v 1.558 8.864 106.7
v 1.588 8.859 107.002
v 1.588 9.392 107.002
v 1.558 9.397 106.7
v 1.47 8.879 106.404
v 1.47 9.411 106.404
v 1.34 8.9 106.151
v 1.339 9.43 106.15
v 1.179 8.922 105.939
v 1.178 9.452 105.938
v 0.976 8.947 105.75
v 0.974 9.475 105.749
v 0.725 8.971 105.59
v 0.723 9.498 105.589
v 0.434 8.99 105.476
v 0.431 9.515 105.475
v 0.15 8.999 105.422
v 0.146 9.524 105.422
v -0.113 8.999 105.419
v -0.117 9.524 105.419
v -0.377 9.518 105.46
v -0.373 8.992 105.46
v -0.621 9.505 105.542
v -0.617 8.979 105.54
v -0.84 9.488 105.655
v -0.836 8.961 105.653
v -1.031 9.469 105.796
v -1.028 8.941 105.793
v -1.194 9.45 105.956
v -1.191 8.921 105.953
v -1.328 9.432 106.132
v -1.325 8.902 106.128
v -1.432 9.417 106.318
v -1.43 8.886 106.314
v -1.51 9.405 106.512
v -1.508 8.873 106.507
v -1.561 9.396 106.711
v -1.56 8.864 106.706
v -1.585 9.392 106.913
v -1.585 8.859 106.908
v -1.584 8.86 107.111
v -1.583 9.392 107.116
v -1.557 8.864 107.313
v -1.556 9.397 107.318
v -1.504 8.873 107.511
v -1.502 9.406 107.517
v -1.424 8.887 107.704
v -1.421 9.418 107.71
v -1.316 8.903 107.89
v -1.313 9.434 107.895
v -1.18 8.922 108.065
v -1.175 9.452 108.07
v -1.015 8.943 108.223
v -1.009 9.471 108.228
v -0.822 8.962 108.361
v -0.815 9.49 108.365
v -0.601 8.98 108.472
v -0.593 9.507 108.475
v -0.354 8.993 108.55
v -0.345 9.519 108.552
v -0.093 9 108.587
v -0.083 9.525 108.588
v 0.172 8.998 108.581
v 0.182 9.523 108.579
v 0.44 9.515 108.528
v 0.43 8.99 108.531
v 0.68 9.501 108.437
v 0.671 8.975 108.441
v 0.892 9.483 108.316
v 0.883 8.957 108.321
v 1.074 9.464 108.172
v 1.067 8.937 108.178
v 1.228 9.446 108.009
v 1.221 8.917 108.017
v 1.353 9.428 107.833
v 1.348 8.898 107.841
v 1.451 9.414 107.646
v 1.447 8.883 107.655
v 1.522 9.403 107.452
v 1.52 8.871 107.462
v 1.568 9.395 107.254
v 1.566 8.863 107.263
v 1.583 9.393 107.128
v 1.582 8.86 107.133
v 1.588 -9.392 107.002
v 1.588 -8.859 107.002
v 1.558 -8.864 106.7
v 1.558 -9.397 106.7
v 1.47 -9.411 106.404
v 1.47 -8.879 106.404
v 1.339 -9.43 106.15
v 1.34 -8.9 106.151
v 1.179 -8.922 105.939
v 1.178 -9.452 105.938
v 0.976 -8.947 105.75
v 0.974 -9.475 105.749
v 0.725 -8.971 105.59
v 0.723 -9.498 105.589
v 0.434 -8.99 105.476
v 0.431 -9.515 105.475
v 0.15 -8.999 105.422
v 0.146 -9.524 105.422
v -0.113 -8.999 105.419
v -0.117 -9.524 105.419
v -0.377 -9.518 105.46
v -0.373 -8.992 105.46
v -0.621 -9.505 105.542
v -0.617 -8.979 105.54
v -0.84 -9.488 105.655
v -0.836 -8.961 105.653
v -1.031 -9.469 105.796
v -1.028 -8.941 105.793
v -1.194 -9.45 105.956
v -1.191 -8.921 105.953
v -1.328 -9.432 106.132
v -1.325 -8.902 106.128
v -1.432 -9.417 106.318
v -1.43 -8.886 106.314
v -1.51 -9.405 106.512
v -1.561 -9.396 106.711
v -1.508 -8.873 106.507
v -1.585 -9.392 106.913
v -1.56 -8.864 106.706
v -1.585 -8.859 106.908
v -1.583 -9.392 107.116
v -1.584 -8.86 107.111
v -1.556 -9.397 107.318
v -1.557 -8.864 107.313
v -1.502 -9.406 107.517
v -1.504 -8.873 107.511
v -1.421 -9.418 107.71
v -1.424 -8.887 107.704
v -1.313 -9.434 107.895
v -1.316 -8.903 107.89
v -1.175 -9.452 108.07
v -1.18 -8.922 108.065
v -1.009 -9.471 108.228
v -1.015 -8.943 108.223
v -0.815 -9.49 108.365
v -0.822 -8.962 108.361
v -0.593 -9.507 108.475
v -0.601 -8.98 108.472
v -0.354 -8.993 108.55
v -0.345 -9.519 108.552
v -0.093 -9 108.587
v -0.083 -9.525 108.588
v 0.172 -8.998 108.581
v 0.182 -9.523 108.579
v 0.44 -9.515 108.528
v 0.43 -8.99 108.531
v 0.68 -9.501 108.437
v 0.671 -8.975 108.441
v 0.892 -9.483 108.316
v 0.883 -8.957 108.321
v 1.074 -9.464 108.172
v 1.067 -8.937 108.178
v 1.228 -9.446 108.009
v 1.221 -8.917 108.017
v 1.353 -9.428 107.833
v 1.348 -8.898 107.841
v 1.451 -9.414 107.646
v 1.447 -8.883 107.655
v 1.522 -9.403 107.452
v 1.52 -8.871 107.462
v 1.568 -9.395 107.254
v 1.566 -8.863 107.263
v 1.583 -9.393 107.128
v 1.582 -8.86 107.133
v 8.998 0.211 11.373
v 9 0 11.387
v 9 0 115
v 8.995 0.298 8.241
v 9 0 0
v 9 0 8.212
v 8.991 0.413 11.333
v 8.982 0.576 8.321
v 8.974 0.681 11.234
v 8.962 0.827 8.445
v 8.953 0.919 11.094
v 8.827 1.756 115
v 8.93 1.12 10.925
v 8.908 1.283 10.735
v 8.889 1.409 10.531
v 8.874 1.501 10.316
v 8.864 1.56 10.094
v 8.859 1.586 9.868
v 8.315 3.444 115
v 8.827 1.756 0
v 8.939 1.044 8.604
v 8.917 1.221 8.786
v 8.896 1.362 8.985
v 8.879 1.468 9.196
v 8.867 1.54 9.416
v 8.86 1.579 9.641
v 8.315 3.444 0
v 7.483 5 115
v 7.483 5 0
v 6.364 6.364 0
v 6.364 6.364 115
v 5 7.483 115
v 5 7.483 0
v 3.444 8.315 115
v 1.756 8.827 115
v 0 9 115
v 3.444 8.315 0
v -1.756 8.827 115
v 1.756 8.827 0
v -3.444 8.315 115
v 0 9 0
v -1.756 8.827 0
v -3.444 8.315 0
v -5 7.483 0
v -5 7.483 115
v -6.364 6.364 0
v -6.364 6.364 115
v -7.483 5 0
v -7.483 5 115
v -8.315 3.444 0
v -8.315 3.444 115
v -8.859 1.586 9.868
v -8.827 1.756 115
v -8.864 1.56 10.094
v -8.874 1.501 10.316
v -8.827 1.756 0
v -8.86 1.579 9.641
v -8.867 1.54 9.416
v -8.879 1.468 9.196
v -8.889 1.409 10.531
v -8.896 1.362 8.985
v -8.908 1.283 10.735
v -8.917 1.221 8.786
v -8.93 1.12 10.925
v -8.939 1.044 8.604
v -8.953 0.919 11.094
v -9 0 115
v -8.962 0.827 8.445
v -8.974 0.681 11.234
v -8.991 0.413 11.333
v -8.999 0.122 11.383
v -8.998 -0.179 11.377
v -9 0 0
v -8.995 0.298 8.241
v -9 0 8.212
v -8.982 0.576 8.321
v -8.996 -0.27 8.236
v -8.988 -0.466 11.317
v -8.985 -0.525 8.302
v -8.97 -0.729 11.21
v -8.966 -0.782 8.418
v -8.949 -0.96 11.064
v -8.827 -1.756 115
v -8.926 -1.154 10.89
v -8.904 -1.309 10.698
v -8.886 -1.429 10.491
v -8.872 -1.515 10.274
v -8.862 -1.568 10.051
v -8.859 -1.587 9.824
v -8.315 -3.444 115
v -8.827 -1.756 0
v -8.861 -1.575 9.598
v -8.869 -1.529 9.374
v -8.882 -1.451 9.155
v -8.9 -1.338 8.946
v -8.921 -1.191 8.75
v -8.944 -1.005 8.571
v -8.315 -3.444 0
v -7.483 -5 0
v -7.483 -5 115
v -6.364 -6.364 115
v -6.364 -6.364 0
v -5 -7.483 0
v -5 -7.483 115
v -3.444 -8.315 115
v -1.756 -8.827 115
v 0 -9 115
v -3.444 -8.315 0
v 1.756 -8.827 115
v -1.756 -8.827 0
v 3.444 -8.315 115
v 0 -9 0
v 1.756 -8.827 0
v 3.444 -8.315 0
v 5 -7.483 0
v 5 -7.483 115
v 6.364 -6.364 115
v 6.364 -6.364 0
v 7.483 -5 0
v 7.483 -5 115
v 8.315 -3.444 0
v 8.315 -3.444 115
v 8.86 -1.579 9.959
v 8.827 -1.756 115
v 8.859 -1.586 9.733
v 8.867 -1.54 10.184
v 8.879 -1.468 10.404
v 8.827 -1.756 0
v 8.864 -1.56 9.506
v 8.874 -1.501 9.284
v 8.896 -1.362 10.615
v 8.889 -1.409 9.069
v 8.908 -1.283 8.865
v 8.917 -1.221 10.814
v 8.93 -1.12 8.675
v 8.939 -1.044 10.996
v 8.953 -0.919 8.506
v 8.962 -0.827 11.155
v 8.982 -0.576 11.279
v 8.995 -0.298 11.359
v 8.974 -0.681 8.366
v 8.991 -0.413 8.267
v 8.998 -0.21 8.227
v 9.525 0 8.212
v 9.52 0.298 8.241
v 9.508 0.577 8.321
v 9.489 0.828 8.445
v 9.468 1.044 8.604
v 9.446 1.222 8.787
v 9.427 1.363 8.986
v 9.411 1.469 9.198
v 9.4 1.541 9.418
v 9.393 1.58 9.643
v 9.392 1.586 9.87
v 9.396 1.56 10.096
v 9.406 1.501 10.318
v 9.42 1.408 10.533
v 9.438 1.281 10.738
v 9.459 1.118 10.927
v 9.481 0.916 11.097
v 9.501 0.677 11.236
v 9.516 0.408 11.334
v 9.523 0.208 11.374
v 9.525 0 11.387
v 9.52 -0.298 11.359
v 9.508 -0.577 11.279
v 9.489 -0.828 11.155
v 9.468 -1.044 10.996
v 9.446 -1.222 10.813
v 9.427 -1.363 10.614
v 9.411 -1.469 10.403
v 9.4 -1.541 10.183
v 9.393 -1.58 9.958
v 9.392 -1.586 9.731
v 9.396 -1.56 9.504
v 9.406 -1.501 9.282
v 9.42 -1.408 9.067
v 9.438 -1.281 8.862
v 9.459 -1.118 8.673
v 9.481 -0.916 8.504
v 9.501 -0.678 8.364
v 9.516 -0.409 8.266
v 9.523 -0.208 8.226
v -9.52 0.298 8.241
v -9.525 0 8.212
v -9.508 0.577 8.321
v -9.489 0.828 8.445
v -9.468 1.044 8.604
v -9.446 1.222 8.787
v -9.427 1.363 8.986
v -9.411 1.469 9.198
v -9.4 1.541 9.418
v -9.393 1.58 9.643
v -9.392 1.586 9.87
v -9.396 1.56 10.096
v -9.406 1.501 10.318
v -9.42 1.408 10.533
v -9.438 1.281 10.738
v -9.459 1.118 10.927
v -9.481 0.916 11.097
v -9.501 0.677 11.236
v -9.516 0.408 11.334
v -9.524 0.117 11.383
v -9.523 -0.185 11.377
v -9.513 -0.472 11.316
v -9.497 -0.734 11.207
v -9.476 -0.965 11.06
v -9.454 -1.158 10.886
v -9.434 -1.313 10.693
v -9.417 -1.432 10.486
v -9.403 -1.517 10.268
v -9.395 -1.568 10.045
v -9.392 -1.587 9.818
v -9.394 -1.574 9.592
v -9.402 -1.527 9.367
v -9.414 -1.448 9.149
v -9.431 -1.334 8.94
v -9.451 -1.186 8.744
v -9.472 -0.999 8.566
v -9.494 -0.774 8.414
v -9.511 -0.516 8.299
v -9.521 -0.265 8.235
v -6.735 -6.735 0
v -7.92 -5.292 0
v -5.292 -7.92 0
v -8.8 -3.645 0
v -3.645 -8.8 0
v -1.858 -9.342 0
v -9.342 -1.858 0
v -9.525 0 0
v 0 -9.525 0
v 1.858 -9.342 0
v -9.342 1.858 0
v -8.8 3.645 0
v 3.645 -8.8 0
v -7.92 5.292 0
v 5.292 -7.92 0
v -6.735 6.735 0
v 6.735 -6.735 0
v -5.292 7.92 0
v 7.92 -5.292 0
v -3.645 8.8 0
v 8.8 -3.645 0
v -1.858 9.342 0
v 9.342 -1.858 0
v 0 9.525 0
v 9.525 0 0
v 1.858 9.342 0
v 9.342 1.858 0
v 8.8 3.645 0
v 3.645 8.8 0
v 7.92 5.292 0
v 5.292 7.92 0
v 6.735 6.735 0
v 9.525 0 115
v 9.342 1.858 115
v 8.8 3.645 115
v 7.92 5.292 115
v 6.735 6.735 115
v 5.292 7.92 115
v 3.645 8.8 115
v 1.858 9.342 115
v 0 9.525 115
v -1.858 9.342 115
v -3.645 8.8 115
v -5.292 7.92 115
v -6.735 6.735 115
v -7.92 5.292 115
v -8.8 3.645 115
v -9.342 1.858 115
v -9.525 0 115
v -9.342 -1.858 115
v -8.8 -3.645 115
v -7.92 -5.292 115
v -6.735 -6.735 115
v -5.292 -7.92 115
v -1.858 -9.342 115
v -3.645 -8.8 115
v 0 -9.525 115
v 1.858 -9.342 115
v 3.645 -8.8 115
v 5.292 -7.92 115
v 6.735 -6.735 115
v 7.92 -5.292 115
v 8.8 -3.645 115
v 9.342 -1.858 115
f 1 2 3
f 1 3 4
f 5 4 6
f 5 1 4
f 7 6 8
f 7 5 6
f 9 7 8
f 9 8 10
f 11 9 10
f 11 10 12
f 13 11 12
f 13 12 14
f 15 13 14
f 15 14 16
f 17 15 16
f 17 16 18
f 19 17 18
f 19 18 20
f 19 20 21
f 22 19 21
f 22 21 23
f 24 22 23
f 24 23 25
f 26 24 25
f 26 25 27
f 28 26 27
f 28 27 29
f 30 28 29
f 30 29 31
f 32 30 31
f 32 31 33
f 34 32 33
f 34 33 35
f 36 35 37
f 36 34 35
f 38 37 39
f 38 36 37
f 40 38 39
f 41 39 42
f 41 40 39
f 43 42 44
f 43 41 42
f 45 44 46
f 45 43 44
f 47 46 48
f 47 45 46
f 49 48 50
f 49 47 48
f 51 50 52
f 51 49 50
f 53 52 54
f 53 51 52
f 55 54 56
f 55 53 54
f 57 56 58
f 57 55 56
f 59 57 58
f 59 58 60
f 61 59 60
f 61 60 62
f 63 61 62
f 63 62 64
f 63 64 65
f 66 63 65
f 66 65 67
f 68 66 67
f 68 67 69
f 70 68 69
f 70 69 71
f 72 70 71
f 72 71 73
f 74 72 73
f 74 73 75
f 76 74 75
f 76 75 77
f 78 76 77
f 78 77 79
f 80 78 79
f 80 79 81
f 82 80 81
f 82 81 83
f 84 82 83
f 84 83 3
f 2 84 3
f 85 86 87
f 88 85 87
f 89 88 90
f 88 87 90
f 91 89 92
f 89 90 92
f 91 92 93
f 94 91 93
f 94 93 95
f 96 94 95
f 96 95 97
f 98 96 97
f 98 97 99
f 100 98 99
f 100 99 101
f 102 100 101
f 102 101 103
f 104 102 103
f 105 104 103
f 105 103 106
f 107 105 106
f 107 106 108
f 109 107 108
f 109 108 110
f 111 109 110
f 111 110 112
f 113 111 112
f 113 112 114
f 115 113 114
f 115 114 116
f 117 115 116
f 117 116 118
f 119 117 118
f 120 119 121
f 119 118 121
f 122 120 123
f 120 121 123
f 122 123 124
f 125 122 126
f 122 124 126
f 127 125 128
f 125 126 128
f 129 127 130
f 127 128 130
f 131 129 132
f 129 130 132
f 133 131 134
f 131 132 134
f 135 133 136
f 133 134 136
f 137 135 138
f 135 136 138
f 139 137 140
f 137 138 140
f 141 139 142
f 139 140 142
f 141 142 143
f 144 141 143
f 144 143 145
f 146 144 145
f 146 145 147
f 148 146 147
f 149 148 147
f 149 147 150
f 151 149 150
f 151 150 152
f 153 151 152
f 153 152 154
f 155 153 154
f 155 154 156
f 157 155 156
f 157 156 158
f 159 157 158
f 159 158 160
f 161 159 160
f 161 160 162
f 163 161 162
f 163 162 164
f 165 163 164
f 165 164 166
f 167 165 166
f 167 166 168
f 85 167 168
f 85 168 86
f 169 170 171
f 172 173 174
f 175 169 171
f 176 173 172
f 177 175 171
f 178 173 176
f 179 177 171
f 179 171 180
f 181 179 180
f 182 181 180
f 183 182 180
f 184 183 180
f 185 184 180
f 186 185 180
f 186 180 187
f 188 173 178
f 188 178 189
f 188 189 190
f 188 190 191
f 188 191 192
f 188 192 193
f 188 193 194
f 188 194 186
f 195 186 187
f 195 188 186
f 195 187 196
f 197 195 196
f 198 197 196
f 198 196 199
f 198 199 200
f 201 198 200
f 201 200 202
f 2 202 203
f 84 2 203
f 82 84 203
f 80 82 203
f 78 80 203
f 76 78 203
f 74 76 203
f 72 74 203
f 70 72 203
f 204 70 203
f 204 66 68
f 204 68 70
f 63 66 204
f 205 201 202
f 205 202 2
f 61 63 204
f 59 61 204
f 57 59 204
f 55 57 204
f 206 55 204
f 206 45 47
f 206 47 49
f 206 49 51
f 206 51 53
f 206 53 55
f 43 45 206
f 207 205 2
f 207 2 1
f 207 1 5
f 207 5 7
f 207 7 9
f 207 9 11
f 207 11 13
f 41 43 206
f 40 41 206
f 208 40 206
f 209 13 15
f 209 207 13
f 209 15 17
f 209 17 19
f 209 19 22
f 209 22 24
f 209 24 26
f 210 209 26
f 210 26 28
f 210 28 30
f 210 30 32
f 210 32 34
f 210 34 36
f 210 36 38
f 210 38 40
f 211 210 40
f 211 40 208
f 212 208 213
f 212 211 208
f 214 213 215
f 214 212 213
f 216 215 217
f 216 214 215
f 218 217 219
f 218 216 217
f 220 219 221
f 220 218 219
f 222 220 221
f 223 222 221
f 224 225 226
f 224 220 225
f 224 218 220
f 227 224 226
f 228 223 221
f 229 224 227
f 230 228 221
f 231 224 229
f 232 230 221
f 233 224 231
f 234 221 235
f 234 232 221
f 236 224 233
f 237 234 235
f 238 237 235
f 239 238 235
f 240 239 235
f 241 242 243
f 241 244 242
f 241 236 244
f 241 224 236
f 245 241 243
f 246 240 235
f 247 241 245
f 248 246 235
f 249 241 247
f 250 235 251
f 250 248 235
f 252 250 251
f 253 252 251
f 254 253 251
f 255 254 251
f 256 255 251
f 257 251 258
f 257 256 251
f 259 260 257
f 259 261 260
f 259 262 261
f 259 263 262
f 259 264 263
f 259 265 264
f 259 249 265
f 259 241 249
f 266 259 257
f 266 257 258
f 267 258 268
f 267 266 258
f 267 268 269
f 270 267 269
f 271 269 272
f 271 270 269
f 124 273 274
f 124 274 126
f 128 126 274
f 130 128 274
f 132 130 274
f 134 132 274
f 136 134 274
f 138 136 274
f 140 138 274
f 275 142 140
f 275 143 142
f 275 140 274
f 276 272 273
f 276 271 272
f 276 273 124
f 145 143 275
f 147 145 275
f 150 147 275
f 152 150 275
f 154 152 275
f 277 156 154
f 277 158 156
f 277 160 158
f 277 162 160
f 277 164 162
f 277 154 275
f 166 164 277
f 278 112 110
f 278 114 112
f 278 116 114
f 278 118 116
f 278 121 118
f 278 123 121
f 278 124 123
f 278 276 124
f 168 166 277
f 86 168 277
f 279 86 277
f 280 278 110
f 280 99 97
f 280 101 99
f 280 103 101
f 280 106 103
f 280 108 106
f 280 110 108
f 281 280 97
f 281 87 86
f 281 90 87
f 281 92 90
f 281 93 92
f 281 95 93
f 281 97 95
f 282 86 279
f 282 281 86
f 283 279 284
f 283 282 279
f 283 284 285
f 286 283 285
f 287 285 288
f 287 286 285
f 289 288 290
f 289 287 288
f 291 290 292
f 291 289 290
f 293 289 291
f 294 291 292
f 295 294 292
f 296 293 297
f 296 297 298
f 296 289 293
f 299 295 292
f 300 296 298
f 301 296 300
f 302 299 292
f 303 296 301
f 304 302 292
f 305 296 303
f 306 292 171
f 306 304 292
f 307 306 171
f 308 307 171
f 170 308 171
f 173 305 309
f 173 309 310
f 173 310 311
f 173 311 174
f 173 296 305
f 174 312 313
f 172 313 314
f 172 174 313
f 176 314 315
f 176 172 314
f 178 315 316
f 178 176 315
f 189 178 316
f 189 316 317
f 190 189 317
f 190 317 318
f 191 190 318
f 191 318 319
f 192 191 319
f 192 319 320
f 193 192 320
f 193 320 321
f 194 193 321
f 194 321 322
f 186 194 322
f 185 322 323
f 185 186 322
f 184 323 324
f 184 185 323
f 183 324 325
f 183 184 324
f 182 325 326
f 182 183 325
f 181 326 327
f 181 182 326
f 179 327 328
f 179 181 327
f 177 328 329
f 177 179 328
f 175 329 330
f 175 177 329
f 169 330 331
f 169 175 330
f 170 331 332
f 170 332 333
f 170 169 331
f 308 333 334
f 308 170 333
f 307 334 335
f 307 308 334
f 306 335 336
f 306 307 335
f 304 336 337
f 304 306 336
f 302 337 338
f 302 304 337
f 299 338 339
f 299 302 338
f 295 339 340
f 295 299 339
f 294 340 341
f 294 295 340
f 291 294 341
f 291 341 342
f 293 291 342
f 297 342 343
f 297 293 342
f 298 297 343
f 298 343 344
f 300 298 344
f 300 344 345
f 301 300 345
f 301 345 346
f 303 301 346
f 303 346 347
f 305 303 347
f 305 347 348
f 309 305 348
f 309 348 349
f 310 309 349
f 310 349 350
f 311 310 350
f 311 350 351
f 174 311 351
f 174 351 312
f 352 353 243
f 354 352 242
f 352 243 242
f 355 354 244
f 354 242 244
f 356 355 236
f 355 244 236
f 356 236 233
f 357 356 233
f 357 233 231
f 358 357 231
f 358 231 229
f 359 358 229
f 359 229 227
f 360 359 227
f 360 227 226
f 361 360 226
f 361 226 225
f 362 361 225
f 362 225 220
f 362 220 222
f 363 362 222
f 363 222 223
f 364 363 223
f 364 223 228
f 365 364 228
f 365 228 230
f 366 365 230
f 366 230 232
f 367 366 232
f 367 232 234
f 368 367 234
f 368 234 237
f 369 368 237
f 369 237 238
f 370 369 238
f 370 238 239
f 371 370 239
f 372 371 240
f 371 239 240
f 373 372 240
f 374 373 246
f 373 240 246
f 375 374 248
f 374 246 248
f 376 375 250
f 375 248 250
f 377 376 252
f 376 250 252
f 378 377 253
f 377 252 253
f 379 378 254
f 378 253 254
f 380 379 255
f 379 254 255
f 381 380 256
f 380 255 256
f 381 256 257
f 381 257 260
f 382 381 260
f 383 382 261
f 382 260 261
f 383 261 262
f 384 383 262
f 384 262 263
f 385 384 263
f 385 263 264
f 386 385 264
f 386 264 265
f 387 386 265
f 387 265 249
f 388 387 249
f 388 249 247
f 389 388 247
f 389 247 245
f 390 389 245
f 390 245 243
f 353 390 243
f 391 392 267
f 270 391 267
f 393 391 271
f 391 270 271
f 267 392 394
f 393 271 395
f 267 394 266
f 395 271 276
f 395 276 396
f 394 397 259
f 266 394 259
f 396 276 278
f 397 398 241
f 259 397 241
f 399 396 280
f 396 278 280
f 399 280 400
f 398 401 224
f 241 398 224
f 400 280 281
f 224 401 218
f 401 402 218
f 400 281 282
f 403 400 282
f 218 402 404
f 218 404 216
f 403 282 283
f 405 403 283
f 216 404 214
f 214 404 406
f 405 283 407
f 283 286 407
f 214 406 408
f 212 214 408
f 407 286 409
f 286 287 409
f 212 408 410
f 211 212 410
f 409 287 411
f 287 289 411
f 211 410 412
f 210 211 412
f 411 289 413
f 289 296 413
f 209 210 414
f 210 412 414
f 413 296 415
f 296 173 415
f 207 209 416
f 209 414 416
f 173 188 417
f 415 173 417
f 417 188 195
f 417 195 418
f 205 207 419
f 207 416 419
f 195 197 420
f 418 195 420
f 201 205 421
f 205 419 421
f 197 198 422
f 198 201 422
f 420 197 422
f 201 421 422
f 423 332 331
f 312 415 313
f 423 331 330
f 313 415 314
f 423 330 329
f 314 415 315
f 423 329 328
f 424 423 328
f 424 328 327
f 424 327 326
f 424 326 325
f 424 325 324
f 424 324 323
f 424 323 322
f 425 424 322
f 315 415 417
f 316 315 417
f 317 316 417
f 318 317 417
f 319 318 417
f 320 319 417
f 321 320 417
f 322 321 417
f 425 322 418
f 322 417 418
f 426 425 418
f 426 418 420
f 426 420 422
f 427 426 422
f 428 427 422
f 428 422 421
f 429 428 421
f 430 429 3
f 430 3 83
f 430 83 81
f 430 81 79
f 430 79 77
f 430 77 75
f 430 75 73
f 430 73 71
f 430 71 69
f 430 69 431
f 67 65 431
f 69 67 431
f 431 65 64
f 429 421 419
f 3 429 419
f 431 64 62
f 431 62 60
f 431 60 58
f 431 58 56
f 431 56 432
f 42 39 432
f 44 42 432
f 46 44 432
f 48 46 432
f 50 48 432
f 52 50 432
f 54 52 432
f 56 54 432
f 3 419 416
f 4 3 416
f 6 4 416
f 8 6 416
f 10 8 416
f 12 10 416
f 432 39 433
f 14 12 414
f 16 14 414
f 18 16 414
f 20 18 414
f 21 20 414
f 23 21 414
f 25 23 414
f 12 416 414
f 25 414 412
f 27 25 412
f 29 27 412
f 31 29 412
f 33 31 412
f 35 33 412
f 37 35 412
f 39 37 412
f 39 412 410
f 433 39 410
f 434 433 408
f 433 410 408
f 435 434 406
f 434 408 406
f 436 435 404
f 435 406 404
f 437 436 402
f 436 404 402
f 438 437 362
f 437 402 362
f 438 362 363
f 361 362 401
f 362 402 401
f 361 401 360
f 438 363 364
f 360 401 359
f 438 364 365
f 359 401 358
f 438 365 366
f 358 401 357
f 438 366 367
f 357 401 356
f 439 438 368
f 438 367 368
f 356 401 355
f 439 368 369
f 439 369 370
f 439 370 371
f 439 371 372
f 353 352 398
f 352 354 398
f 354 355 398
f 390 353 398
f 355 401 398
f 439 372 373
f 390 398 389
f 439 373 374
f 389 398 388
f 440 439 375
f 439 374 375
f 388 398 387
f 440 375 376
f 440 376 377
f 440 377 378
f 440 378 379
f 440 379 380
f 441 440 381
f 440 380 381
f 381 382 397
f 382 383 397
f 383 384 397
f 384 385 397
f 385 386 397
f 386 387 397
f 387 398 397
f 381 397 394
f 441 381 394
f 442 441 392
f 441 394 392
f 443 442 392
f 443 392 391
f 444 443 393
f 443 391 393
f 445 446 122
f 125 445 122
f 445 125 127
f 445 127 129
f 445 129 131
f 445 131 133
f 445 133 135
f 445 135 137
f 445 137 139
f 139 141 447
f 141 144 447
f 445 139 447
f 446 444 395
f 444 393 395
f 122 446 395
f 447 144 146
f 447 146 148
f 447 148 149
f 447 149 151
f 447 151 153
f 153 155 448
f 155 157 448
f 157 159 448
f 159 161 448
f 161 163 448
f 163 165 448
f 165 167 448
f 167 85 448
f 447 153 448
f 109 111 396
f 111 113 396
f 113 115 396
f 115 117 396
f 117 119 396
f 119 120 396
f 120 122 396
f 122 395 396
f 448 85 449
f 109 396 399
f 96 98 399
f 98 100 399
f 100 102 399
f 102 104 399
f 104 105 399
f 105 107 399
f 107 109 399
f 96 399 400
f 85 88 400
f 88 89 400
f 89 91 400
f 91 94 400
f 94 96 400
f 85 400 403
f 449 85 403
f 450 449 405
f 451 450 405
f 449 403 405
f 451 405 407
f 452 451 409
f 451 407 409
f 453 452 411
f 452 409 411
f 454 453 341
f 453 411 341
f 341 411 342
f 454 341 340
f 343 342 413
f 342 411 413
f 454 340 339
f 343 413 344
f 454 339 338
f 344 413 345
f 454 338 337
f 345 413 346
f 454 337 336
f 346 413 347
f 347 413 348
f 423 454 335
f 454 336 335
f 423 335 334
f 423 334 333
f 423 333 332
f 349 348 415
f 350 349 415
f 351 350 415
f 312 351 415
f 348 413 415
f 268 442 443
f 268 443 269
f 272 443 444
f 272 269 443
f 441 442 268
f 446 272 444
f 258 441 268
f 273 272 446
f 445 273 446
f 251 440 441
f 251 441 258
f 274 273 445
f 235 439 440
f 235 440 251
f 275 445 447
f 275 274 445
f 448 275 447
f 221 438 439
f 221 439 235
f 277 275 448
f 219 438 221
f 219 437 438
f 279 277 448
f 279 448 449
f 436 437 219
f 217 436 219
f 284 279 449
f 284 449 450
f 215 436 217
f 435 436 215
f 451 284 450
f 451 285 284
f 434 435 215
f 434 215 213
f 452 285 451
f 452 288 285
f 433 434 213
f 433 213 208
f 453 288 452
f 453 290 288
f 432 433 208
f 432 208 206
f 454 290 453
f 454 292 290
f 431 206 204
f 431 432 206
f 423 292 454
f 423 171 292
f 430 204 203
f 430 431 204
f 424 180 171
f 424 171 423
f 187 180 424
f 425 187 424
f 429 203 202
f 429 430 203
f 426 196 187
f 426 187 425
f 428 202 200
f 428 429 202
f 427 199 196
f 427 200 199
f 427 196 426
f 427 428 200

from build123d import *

# Parameters (mm, degrees)
CROQUIS1_R                 = 9.525
CROQUIS1_R_2               = 9
SALIENTE_EXTRUIR1_DEPTH    = 115
CROQUIS2_R                 = 1.5875
CORTAR_EXTRUIR1_DEPTH      = 10.525
CORTAR_EXTRUIR1_DEPTH_BACK = 10.525
CROQUIS3_R                 = 1.5875
CORTAR_EXTRUIR2_DEPTH      = 10.5250001
CORTAR_EXTRUIR2_DEPTH_BACK = 10.5250001


with BuildPart() as part:
    # Croquis1 → Saliente-Extruir1 (new body)
    with BuildSketch(Plane.XY):
        Circle(CROQUIS1_R)
        Circle(CROQUIS1_R_2, mode=Mode.SUBTRACT)
    extrude(amount=SALIENTE_EXTRUIR1_DEPTH)

    # Croquis2 → Cortar-Extruir1 (cut, two sides)
    with BuildSketch(Plane(origin=(0, 0, 0), x_dir=(0, 0, -1), z_dir=(1, 0, 0))) as cortar_extruir1_sk:
        with Locations((-9.8, 0)):
            Circle(CROQUIS2_R)
    extrude(amount=CORTAR_EXTRUIR1_DEPTH, mode=Mode.SUBTRACT)
    extrude(cortar_extruir1_sk.sketch, amount=-CORTAR_EXTRUIR1_DEPTH_BACK, mode=Mode.SUBTRACT)

    # Croquis3 → Cortar-Extruir2 (cut, two sides)
    with BuildSketch(Plane(origin=(0, 0, 0), x_dir=(1, 0, 0), z_dir=(0, 1, 0))) as cortar_extruir2_sk:
        with Locations((0, -107.0025)):
            Circle(CROQUIS3_R)
    extrude(amount=CORTAR_EXTRUIR2_DEPTH, mode=Mode.SUBTRACT)
    extrude(cortar_extruir2_sk.sketch, amount=-CORTAR_EXTRUIR2_DEPTH_BACK, mode=Mode.SUBTRACT)


solid = part.part
